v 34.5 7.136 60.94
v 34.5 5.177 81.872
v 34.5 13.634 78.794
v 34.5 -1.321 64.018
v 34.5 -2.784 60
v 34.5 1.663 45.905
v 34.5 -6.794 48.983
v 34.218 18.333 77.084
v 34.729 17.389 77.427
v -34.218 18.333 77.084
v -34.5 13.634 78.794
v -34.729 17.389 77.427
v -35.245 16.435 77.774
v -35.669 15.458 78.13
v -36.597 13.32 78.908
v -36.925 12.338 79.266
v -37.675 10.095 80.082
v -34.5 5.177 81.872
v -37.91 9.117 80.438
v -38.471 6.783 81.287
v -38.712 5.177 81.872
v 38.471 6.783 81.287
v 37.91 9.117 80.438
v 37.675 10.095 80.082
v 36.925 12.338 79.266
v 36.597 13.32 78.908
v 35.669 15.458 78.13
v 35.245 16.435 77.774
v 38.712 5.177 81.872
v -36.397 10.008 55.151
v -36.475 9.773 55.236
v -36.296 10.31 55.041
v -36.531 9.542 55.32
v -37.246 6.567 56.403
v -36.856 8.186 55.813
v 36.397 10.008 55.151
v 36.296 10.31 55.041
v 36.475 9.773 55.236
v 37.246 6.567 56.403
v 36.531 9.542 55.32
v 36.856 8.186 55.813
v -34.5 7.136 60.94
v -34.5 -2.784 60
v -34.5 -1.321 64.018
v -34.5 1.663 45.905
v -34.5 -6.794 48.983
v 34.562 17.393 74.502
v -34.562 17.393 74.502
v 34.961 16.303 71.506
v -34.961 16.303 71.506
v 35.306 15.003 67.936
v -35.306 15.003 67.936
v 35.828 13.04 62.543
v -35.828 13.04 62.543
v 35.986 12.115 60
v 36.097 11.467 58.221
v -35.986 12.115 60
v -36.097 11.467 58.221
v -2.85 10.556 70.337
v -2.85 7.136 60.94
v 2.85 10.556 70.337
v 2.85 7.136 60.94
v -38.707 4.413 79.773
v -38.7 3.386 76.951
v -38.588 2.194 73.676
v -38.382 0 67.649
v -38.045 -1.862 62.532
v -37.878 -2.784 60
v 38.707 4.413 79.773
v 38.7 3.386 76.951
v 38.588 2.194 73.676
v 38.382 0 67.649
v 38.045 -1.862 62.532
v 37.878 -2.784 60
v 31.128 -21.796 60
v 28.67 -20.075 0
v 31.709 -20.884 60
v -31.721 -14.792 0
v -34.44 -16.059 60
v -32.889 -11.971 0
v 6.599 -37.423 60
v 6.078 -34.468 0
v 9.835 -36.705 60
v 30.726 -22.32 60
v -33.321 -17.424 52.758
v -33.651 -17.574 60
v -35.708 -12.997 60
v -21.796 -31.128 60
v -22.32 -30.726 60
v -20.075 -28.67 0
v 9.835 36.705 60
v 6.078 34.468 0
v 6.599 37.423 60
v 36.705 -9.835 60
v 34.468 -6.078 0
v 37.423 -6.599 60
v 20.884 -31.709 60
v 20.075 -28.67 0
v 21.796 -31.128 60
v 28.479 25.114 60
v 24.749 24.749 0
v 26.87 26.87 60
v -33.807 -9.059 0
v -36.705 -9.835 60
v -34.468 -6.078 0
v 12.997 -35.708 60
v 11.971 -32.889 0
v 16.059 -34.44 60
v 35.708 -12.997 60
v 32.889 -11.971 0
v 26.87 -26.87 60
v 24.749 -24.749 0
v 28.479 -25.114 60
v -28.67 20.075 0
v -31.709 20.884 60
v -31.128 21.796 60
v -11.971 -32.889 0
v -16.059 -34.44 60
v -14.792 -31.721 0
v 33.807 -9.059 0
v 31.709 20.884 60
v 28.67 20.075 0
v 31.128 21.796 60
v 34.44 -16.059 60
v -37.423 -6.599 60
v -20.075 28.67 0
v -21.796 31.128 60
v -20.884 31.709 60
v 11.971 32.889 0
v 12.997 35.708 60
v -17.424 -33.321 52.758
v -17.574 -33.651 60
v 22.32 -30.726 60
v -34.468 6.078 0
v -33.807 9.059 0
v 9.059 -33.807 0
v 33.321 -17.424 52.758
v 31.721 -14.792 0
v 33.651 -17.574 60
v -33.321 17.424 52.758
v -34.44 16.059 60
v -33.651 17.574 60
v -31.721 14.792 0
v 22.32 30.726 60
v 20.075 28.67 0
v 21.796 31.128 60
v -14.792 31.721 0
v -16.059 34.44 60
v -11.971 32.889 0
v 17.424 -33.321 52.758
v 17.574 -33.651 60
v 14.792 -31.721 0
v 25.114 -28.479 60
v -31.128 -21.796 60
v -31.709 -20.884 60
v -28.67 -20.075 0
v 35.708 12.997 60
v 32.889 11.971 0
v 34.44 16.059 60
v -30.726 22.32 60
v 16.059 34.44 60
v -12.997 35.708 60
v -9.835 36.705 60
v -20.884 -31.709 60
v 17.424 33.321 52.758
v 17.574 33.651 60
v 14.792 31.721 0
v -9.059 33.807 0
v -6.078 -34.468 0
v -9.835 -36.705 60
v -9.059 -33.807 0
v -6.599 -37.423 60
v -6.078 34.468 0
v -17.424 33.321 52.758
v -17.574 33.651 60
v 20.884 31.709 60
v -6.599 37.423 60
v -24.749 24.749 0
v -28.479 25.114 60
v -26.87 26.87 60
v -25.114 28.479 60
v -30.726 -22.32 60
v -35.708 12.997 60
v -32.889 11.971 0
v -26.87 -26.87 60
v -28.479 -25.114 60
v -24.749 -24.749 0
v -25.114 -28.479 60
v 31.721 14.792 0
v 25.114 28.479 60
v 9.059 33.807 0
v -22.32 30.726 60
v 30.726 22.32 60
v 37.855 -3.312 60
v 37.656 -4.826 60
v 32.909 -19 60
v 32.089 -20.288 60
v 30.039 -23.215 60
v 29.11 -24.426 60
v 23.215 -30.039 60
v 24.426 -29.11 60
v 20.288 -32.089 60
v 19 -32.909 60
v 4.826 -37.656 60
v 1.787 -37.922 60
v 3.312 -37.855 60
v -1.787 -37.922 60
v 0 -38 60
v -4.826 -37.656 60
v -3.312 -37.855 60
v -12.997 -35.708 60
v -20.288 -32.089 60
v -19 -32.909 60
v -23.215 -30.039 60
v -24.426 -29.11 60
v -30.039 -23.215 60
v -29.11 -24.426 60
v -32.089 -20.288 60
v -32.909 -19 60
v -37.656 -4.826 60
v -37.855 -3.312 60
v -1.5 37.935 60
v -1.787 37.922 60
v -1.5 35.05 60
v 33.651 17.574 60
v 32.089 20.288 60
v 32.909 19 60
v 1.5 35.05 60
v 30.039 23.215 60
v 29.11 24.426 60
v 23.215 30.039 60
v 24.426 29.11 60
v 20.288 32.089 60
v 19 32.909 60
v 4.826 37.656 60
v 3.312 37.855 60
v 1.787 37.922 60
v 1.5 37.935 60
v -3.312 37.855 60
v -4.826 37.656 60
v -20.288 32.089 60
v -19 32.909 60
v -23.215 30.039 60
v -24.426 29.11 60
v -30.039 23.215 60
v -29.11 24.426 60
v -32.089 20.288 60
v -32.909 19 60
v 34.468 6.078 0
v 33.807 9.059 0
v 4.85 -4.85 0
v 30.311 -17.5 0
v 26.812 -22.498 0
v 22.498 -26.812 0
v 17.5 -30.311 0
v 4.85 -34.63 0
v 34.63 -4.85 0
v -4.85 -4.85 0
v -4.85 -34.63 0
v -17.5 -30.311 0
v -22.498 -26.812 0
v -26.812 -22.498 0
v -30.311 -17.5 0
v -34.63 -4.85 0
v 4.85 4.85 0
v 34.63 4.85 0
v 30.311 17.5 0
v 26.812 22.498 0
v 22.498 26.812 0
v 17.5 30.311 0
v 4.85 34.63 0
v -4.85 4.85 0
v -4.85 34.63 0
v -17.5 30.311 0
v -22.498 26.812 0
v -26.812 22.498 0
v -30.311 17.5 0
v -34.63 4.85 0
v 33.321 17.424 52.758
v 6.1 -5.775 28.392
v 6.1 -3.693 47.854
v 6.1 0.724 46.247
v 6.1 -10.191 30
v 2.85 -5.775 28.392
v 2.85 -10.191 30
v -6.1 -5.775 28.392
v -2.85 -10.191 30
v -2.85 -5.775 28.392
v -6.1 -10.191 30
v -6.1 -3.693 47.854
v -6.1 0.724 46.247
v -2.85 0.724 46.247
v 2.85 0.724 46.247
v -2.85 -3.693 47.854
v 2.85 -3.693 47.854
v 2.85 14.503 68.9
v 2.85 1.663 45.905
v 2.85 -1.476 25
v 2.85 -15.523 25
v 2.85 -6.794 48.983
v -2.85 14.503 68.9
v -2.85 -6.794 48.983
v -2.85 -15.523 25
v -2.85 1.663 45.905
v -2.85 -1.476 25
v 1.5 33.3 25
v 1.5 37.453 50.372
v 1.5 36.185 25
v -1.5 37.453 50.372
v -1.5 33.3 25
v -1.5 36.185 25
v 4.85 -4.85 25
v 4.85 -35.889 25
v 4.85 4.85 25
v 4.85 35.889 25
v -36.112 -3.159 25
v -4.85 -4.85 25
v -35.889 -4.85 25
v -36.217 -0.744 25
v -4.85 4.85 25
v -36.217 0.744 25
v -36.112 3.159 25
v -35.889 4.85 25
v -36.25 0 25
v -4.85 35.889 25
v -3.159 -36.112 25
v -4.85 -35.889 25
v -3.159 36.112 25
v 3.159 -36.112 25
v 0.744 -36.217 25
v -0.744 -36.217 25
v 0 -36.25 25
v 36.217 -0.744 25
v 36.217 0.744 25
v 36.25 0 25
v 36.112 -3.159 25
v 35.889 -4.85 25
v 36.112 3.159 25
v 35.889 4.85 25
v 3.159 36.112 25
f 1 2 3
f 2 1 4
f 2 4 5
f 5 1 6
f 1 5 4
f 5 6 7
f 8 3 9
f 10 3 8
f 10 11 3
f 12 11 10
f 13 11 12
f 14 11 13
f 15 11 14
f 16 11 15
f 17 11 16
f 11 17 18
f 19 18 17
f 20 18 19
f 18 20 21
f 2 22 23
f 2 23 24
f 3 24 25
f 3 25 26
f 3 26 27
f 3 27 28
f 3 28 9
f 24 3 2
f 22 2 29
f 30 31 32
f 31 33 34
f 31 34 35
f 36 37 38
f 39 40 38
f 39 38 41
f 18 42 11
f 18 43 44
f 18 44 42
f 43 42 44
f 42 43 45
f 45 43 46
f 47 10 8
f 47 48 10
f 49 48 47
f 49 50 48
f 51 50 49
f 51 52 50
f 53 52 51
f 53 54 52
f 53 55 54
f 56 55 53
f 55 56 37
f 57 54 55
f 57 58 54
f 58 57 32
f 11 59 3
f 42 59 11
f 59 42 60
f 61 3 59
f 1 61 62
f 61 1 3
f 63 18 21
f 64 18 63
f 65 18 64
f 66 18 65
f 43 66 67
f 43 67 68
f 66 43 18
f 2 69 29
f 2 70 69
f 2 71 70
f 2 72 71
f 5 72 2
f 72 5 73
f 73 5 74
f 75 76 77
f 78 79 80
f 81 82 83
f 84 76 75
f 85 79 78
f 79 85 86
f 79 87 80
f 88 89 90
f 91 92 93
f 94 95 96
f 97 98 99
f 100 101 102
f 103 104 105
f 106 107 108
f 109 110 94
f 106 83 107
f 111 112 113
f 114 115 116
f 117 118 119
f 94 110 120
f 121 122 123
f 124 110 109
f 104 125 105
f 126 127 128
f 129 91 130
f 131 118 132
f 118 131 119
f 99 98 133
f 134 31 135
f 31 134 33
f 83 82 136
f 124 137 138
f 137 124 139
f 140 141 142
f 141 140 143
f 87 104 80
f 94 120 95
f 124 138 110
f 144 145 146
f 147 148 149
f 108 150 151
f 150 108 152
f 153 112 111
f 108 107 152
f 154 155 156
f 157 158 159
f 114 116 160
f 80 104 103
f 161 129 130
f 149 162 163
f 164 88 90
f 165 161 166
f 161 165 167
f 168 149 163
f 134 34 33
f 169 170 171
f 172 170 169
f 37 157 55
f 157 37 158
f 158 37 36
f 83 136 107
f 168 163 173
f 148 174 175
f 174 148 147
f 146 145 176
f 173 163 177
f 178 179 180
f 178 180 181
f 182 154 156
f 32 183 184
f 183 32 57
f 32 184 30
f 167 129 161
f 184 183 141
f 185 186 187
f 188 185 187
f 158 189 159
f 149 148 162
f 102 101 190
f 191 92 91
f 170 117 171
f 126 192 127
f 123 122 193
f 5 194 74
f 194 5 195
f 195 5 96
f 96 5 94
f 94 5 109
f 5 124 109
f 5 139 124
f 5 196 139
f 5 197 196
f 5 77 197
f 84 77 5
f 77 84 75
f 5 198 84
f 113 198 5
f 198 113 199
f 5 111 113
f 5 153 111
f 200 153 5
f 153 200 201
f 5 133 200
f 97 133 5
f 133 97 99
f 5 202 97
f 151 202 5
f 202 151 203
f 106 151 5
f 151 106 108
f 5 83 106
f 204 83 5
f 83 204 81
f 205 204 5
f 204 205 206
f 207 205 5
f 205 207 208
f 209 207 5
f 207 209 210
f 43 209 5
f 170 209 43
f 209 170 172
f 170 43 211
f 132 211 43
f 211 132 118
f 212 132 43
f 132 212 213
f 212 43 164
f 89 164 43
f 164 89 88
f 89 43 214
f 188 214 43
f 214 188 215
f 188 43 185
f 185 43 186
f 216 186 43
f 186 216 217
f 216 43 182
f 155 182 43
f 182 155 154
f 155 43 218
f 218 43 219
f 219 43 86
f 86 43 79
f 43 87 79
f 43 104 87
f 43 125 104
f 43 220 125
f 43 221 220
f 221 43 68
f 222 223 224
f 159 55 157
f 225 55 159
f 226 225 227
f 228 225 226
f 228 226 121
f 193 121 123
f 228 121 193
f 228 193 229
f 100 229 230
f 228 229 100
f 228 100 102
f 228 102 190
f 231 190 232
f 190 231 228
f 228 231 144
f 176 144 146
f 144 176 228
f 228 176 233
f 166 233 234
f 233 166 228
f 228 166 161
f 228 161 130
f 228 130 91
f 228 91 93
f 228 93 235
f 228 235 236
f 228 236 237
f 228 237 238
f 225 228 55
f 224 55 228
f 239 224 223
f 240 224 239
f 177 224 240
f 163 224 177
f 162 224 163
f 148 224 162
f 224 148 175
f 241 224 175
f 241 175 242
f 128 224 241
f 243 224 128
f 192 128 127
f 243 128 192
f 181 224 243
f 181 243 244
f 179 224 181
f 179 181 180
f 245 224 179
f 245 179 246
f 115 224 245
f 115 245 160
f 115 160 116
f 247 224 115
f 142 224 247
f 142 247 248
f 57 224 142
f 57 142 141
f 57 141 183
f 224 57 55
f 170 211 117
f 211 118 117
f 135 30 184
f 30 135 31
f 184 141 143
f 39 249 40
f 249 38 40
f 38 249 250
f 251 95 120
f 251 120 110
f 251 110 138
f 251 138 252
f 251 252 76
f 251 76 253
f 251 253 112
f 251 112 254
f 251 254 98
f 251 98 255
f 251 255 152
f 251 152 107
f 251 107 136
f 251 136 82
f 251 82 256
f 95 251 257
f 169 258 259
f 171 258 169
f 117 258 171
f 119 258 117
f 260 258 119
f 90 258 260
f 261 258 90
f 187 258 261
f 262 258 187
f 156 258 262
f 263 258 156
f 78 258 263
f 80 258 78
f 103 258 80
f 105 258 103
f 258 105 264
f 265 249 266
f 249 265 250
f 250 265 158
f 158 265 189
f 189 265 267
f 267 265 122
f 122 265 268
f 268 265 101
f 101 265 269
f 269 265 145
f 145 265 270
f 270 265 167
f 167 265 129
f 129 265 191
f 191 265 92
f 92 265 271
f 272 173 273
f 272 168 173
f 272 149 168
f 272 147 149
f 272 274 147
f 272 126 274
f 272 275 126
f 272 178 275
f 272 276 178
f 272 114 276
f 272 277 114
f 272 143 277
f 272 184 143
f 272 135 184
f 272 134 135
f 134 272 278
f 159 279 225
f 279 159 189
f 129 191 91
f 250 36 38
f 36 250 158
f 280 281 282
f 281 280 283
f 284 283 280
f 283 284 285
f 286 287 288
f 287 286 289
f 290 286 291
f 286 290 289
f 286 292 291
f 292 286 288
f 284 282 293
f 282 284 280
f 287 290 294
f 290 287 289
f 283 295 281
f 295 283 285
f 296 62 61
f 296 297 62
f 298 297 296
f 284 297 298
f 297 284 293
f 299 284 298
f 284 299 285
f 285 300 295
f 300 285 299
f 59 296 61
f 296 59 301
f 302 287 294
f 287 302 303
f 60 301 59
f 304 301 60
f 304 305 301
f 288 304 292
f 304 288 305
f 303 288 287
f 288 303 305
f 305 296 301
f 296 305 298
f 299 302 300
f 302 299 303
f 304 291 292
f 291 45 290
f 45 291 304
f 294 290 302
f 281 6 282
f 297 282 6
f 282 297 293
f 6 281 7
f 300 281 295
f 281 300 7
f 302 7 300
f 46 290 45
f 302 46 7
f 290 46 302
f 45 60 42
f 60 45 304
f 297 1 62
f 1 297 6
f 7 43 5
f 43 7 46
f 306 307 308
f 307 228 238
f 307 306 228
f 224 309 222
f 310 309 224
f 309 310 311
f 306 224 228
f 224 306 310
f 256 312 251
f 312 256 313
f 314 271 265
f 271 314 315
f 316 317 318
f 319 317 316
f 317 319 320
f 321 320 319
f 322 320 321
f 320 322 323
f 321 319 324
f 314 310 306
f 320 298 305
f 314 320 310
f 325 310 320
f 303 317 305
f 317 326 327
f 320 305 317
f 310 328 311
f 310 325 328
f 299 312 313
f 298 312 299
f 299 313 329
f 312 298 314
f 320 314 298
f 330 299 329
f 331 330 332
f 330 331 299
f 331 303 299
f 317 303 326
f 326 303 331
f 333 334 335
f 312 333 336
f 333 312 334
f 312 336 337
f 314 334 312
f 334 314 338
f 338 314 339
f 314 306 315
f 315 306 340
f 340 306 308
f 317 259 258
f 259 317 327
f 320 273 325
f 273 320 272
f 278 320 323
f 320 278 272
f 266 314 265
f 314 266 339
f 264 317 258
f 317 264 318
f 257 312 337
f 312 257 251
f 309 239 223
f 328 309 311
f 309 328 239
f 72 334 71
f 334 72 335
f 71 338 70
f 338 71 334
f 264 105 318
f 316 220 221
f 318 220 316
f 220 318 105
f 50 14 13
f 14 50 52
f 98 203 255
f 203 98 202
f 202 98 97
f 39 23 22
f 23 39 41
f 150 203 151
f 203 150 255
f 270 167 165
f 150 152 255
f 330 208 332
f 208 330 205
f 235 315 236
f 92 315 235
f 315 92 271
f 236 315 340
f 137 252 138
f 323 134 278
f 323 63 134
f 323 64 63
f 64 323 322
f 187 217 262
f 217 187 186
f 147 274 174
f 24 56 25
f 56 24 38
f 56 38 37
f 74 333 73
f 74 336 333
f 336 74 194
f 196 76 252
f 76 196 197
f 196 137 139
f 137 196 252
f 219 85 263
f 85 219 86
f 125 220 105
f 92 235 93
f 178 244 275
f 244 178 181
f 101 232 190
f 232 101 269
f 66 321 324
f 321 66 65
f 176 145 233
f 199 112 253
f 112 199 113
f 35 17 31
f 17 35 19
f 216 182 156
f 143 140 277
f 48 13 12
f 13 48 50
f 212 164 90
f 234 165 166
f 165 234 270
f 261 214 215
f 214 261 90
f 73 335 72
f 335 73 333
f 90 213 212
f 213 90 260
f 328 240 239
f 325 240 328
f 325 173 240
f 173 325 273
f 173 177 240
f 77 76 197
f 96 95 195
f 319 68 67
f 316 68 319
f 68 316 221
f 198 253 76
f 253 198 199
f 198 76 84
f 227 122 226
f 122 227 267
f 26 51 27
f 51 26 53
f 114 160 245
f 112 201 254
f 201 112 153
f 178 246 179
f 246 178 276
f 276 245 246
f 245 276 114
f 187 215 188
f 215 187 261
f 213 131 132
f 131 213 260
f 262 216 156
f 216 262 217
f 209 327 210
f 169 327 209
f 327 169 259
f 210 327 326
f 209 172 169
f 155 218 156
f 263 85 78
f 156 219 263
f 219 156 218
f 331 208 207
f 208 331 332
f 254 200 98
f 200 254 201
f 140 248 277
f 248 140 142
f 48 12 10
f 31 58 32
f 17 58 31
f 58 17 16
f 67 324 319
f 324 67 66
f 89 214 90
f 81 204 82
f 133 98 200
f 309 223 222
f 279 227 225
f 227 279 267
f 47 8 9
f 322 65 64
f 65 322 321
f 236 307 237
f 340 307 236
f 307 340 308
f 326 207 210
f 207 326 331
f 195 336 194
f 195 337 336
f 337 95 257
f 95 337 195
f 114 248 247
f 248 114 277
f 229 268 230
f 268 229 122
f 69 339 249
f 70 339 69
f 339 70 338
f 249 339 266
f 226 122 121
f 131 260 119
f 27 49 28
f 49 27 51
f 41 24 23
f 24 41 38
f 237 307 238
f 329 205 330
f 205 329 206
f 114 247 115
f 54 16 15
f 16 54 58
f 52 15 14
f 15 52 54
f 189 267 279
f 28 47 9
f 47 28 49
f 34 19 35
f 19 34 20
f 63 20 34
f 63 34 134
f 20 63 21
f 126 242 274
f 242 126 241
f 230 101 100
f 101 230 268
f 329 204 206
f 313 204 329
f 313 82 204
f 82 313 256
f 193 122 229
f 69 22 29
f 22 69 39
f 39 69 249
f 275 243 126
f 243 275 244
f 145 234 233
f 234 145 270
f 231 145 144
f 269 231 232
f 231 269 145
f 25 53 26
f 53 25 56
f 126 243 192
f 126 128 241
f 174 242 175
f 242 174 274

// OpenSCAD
/*

Customisable cup holder adapter for a phone

Originally designed for Toyota Yaris cup holder to fit a Samsung Galaxy S8

(c) Matthias Liffers 2018

Released under CC-BY 4.0 license

All dimensions in millimetres

Changelog:

v0.1
 * First release

v0.2
 * Added side walls to dock rest to stop phone falling over when not plugged in
 * Added plug offset for phones where the plug is not dead centre along the y axis
 * Removed roundess from top

v1.0
 * modularised code
 * a bit more friendly for Thingiverse Customizer

v2.0
 * Converted from rounded shape to tapered shape
 * Added shelf to hold charging plug so that it doesn't get pushed down when the phone is inserted

*/ 

/* [ Basics ] */

// Diameter of cup holder
holder_top_diameter = 76;
// Diamater of cup holder bottom
holder_bottom_diameter = 70;
// Height of cup holder
holder_height = 60;

// Phone width
phone_x = 69;
// Phone Depth
phone_y = 9;

// Angle at which the phone should lean back
dock_angle = 20;
// Depth at which phone should be inset into the holder
dock_z = 15;

/* [ Back rest ] */

// Add back rest
dock_rest = true;
// Phone back rest height
dock_rest_z = 20;
// Phone back rest width
dock_rest_x = phone_x;
// Phone back rest depth
dock_rest_y = 5;

/* [ Charge plug hole ] */

plug = true; // Add charge plug hole
// Width of charging plug
plug_x = 12.2;
// Depth of charging plug
plug_y = 4.7;
// Length of charging plug, minus the contacts
plug_z = 19;
// Distance of charging plug from front of phone
plug_offset = 3.3;

/* [ Cable routing channel ] */

// Add cable routing channel
cable = true;
// Width of cable routing channel
cable_x = 3;
// Depth of cable routing channel
cable_y = 3;

// Smoothness of all rounded edges. Use a low number for faster rendering, increase when performing final render
round_smoothness= 72;

cos_d_a = cos(dock_angle);
sin_d_a = sin(dock_angle);
tan_d_a = tan(dock_angle);

holder_top_radius = holder_top_diameter/2;
holder_bottom_radius = holder_bottom_diameter/2;
dock_drop = (sin_d_a * phone_y / 2) - (cos_d_a * dock_z / 2);
dock_height_add = tan_d_a * (phone_y / 2 + dock_rest_y);
gouge_height = holder_height - ((cos_d_a * plug_z) + (cos_d_a * dock_z) - (sin_d_a * (phone_y - plug_offset))) - 5;
rest_setback = (sin_d_a * dock_z / 2) + (cos_d_a * phone_y / 2);

difference() {
    difference() {
        union() {
            // Main body
            cylinder( h = holder_height, r1 = holder_bottom_radius, r2 = holder_top_radius, $fn=round_smoothness);
                // Dock rest
                if (dock_rest)
                    create_dock_rest();
        }
        // Phone inset
        translate([(0 - phone_x) / 2, 0, holder_height + dock_drop])
            rotate(a = (0 - dock_angle), v = [1, 0, 0])
                translate ([0, 0 - (phone_y / 2), 0 - (dock_z / 2)])
                    union() {
                        cube([phone_x, phone_y, dock_z + 1]);
                        if (plug) 
                            create_plug_hole();
                    }
        // Cable channel
        if (cable)
            create_cable_channel();
        // Bottom gouges
        translate([0 - (plug_y + 5) / 2, 0 - holder_top_radius, -1])
            cube([plug_y + 5, holder_top_diameter, gouge_height + 1]);
        translate([0 - holder_top_radius, 0 - (plug_y + 5) / 2, -1])
            cube([holder_top_diameter, plug_y + 5, gouge_height +1 ]);
    }
    // Trim entire cup holder down to just the radius and slice the top off the dock
    difference() {
        cylinder(h = holder_height + dock_rest_z * 2, r = holder_top_radius * 2, $fn = round_smoothness);
         cylinder(h = holder_height * 2, r1 = holder_bottom_radius, r2 = holder_top_radius + (holder_top_radius - holder_bottom_radius), $fn = round_smoothness);
    }
}

module create_dock_rest() {
    translate([0 - (dock_rest_x / 2), rest_setback, holder_height])
        rotate(a = (0 - dock_angle), v = [1, 0, 0])
            translate([0, 0, 0 - dock_height_add])
                union() {
                    cube([dock_rest_x, dock_rest_y, dock_rest_z + dock_height_add]);
                    translate([0 - dock_rest_y, 0 - phone_y, 0])
                        cube([dock_rest_y, phone_y + dock_rest_y, dock_rest_z + dock_height_add]);
                    translate([dock_rest_x, 0 - phone_y, 0])
                        cube([dock_rest_y, phone_y + dock_rest_y, dock_rest_z + dock_height_add]);
                }    
}

module create_cable_channel() {
    translate([0 - (cable_x / 2), holder_top_radius -  2 * cable_y, -1])
        rotate(a = 0-atan((holder_top_radius - holder_bottom_radius)/ holder_height), v = [1,0,0])
            cube([cable_x, cable_y, holder_height +2]);
}

module create_plug_hole() {
    translate([phone_x / 2 - plug_x / 2, plug_offset, 0 - plug_z])
        union() {
            cube([plug_x, plug_y, plug_z + 1]);
            translate([plug_x/2 - plug_y/2 - 0.5, 0 - plug_offset, - 13])
                cube([plug_y + 1, plug_x + 1, plug_z + plug_z + 20]);
        }
}
